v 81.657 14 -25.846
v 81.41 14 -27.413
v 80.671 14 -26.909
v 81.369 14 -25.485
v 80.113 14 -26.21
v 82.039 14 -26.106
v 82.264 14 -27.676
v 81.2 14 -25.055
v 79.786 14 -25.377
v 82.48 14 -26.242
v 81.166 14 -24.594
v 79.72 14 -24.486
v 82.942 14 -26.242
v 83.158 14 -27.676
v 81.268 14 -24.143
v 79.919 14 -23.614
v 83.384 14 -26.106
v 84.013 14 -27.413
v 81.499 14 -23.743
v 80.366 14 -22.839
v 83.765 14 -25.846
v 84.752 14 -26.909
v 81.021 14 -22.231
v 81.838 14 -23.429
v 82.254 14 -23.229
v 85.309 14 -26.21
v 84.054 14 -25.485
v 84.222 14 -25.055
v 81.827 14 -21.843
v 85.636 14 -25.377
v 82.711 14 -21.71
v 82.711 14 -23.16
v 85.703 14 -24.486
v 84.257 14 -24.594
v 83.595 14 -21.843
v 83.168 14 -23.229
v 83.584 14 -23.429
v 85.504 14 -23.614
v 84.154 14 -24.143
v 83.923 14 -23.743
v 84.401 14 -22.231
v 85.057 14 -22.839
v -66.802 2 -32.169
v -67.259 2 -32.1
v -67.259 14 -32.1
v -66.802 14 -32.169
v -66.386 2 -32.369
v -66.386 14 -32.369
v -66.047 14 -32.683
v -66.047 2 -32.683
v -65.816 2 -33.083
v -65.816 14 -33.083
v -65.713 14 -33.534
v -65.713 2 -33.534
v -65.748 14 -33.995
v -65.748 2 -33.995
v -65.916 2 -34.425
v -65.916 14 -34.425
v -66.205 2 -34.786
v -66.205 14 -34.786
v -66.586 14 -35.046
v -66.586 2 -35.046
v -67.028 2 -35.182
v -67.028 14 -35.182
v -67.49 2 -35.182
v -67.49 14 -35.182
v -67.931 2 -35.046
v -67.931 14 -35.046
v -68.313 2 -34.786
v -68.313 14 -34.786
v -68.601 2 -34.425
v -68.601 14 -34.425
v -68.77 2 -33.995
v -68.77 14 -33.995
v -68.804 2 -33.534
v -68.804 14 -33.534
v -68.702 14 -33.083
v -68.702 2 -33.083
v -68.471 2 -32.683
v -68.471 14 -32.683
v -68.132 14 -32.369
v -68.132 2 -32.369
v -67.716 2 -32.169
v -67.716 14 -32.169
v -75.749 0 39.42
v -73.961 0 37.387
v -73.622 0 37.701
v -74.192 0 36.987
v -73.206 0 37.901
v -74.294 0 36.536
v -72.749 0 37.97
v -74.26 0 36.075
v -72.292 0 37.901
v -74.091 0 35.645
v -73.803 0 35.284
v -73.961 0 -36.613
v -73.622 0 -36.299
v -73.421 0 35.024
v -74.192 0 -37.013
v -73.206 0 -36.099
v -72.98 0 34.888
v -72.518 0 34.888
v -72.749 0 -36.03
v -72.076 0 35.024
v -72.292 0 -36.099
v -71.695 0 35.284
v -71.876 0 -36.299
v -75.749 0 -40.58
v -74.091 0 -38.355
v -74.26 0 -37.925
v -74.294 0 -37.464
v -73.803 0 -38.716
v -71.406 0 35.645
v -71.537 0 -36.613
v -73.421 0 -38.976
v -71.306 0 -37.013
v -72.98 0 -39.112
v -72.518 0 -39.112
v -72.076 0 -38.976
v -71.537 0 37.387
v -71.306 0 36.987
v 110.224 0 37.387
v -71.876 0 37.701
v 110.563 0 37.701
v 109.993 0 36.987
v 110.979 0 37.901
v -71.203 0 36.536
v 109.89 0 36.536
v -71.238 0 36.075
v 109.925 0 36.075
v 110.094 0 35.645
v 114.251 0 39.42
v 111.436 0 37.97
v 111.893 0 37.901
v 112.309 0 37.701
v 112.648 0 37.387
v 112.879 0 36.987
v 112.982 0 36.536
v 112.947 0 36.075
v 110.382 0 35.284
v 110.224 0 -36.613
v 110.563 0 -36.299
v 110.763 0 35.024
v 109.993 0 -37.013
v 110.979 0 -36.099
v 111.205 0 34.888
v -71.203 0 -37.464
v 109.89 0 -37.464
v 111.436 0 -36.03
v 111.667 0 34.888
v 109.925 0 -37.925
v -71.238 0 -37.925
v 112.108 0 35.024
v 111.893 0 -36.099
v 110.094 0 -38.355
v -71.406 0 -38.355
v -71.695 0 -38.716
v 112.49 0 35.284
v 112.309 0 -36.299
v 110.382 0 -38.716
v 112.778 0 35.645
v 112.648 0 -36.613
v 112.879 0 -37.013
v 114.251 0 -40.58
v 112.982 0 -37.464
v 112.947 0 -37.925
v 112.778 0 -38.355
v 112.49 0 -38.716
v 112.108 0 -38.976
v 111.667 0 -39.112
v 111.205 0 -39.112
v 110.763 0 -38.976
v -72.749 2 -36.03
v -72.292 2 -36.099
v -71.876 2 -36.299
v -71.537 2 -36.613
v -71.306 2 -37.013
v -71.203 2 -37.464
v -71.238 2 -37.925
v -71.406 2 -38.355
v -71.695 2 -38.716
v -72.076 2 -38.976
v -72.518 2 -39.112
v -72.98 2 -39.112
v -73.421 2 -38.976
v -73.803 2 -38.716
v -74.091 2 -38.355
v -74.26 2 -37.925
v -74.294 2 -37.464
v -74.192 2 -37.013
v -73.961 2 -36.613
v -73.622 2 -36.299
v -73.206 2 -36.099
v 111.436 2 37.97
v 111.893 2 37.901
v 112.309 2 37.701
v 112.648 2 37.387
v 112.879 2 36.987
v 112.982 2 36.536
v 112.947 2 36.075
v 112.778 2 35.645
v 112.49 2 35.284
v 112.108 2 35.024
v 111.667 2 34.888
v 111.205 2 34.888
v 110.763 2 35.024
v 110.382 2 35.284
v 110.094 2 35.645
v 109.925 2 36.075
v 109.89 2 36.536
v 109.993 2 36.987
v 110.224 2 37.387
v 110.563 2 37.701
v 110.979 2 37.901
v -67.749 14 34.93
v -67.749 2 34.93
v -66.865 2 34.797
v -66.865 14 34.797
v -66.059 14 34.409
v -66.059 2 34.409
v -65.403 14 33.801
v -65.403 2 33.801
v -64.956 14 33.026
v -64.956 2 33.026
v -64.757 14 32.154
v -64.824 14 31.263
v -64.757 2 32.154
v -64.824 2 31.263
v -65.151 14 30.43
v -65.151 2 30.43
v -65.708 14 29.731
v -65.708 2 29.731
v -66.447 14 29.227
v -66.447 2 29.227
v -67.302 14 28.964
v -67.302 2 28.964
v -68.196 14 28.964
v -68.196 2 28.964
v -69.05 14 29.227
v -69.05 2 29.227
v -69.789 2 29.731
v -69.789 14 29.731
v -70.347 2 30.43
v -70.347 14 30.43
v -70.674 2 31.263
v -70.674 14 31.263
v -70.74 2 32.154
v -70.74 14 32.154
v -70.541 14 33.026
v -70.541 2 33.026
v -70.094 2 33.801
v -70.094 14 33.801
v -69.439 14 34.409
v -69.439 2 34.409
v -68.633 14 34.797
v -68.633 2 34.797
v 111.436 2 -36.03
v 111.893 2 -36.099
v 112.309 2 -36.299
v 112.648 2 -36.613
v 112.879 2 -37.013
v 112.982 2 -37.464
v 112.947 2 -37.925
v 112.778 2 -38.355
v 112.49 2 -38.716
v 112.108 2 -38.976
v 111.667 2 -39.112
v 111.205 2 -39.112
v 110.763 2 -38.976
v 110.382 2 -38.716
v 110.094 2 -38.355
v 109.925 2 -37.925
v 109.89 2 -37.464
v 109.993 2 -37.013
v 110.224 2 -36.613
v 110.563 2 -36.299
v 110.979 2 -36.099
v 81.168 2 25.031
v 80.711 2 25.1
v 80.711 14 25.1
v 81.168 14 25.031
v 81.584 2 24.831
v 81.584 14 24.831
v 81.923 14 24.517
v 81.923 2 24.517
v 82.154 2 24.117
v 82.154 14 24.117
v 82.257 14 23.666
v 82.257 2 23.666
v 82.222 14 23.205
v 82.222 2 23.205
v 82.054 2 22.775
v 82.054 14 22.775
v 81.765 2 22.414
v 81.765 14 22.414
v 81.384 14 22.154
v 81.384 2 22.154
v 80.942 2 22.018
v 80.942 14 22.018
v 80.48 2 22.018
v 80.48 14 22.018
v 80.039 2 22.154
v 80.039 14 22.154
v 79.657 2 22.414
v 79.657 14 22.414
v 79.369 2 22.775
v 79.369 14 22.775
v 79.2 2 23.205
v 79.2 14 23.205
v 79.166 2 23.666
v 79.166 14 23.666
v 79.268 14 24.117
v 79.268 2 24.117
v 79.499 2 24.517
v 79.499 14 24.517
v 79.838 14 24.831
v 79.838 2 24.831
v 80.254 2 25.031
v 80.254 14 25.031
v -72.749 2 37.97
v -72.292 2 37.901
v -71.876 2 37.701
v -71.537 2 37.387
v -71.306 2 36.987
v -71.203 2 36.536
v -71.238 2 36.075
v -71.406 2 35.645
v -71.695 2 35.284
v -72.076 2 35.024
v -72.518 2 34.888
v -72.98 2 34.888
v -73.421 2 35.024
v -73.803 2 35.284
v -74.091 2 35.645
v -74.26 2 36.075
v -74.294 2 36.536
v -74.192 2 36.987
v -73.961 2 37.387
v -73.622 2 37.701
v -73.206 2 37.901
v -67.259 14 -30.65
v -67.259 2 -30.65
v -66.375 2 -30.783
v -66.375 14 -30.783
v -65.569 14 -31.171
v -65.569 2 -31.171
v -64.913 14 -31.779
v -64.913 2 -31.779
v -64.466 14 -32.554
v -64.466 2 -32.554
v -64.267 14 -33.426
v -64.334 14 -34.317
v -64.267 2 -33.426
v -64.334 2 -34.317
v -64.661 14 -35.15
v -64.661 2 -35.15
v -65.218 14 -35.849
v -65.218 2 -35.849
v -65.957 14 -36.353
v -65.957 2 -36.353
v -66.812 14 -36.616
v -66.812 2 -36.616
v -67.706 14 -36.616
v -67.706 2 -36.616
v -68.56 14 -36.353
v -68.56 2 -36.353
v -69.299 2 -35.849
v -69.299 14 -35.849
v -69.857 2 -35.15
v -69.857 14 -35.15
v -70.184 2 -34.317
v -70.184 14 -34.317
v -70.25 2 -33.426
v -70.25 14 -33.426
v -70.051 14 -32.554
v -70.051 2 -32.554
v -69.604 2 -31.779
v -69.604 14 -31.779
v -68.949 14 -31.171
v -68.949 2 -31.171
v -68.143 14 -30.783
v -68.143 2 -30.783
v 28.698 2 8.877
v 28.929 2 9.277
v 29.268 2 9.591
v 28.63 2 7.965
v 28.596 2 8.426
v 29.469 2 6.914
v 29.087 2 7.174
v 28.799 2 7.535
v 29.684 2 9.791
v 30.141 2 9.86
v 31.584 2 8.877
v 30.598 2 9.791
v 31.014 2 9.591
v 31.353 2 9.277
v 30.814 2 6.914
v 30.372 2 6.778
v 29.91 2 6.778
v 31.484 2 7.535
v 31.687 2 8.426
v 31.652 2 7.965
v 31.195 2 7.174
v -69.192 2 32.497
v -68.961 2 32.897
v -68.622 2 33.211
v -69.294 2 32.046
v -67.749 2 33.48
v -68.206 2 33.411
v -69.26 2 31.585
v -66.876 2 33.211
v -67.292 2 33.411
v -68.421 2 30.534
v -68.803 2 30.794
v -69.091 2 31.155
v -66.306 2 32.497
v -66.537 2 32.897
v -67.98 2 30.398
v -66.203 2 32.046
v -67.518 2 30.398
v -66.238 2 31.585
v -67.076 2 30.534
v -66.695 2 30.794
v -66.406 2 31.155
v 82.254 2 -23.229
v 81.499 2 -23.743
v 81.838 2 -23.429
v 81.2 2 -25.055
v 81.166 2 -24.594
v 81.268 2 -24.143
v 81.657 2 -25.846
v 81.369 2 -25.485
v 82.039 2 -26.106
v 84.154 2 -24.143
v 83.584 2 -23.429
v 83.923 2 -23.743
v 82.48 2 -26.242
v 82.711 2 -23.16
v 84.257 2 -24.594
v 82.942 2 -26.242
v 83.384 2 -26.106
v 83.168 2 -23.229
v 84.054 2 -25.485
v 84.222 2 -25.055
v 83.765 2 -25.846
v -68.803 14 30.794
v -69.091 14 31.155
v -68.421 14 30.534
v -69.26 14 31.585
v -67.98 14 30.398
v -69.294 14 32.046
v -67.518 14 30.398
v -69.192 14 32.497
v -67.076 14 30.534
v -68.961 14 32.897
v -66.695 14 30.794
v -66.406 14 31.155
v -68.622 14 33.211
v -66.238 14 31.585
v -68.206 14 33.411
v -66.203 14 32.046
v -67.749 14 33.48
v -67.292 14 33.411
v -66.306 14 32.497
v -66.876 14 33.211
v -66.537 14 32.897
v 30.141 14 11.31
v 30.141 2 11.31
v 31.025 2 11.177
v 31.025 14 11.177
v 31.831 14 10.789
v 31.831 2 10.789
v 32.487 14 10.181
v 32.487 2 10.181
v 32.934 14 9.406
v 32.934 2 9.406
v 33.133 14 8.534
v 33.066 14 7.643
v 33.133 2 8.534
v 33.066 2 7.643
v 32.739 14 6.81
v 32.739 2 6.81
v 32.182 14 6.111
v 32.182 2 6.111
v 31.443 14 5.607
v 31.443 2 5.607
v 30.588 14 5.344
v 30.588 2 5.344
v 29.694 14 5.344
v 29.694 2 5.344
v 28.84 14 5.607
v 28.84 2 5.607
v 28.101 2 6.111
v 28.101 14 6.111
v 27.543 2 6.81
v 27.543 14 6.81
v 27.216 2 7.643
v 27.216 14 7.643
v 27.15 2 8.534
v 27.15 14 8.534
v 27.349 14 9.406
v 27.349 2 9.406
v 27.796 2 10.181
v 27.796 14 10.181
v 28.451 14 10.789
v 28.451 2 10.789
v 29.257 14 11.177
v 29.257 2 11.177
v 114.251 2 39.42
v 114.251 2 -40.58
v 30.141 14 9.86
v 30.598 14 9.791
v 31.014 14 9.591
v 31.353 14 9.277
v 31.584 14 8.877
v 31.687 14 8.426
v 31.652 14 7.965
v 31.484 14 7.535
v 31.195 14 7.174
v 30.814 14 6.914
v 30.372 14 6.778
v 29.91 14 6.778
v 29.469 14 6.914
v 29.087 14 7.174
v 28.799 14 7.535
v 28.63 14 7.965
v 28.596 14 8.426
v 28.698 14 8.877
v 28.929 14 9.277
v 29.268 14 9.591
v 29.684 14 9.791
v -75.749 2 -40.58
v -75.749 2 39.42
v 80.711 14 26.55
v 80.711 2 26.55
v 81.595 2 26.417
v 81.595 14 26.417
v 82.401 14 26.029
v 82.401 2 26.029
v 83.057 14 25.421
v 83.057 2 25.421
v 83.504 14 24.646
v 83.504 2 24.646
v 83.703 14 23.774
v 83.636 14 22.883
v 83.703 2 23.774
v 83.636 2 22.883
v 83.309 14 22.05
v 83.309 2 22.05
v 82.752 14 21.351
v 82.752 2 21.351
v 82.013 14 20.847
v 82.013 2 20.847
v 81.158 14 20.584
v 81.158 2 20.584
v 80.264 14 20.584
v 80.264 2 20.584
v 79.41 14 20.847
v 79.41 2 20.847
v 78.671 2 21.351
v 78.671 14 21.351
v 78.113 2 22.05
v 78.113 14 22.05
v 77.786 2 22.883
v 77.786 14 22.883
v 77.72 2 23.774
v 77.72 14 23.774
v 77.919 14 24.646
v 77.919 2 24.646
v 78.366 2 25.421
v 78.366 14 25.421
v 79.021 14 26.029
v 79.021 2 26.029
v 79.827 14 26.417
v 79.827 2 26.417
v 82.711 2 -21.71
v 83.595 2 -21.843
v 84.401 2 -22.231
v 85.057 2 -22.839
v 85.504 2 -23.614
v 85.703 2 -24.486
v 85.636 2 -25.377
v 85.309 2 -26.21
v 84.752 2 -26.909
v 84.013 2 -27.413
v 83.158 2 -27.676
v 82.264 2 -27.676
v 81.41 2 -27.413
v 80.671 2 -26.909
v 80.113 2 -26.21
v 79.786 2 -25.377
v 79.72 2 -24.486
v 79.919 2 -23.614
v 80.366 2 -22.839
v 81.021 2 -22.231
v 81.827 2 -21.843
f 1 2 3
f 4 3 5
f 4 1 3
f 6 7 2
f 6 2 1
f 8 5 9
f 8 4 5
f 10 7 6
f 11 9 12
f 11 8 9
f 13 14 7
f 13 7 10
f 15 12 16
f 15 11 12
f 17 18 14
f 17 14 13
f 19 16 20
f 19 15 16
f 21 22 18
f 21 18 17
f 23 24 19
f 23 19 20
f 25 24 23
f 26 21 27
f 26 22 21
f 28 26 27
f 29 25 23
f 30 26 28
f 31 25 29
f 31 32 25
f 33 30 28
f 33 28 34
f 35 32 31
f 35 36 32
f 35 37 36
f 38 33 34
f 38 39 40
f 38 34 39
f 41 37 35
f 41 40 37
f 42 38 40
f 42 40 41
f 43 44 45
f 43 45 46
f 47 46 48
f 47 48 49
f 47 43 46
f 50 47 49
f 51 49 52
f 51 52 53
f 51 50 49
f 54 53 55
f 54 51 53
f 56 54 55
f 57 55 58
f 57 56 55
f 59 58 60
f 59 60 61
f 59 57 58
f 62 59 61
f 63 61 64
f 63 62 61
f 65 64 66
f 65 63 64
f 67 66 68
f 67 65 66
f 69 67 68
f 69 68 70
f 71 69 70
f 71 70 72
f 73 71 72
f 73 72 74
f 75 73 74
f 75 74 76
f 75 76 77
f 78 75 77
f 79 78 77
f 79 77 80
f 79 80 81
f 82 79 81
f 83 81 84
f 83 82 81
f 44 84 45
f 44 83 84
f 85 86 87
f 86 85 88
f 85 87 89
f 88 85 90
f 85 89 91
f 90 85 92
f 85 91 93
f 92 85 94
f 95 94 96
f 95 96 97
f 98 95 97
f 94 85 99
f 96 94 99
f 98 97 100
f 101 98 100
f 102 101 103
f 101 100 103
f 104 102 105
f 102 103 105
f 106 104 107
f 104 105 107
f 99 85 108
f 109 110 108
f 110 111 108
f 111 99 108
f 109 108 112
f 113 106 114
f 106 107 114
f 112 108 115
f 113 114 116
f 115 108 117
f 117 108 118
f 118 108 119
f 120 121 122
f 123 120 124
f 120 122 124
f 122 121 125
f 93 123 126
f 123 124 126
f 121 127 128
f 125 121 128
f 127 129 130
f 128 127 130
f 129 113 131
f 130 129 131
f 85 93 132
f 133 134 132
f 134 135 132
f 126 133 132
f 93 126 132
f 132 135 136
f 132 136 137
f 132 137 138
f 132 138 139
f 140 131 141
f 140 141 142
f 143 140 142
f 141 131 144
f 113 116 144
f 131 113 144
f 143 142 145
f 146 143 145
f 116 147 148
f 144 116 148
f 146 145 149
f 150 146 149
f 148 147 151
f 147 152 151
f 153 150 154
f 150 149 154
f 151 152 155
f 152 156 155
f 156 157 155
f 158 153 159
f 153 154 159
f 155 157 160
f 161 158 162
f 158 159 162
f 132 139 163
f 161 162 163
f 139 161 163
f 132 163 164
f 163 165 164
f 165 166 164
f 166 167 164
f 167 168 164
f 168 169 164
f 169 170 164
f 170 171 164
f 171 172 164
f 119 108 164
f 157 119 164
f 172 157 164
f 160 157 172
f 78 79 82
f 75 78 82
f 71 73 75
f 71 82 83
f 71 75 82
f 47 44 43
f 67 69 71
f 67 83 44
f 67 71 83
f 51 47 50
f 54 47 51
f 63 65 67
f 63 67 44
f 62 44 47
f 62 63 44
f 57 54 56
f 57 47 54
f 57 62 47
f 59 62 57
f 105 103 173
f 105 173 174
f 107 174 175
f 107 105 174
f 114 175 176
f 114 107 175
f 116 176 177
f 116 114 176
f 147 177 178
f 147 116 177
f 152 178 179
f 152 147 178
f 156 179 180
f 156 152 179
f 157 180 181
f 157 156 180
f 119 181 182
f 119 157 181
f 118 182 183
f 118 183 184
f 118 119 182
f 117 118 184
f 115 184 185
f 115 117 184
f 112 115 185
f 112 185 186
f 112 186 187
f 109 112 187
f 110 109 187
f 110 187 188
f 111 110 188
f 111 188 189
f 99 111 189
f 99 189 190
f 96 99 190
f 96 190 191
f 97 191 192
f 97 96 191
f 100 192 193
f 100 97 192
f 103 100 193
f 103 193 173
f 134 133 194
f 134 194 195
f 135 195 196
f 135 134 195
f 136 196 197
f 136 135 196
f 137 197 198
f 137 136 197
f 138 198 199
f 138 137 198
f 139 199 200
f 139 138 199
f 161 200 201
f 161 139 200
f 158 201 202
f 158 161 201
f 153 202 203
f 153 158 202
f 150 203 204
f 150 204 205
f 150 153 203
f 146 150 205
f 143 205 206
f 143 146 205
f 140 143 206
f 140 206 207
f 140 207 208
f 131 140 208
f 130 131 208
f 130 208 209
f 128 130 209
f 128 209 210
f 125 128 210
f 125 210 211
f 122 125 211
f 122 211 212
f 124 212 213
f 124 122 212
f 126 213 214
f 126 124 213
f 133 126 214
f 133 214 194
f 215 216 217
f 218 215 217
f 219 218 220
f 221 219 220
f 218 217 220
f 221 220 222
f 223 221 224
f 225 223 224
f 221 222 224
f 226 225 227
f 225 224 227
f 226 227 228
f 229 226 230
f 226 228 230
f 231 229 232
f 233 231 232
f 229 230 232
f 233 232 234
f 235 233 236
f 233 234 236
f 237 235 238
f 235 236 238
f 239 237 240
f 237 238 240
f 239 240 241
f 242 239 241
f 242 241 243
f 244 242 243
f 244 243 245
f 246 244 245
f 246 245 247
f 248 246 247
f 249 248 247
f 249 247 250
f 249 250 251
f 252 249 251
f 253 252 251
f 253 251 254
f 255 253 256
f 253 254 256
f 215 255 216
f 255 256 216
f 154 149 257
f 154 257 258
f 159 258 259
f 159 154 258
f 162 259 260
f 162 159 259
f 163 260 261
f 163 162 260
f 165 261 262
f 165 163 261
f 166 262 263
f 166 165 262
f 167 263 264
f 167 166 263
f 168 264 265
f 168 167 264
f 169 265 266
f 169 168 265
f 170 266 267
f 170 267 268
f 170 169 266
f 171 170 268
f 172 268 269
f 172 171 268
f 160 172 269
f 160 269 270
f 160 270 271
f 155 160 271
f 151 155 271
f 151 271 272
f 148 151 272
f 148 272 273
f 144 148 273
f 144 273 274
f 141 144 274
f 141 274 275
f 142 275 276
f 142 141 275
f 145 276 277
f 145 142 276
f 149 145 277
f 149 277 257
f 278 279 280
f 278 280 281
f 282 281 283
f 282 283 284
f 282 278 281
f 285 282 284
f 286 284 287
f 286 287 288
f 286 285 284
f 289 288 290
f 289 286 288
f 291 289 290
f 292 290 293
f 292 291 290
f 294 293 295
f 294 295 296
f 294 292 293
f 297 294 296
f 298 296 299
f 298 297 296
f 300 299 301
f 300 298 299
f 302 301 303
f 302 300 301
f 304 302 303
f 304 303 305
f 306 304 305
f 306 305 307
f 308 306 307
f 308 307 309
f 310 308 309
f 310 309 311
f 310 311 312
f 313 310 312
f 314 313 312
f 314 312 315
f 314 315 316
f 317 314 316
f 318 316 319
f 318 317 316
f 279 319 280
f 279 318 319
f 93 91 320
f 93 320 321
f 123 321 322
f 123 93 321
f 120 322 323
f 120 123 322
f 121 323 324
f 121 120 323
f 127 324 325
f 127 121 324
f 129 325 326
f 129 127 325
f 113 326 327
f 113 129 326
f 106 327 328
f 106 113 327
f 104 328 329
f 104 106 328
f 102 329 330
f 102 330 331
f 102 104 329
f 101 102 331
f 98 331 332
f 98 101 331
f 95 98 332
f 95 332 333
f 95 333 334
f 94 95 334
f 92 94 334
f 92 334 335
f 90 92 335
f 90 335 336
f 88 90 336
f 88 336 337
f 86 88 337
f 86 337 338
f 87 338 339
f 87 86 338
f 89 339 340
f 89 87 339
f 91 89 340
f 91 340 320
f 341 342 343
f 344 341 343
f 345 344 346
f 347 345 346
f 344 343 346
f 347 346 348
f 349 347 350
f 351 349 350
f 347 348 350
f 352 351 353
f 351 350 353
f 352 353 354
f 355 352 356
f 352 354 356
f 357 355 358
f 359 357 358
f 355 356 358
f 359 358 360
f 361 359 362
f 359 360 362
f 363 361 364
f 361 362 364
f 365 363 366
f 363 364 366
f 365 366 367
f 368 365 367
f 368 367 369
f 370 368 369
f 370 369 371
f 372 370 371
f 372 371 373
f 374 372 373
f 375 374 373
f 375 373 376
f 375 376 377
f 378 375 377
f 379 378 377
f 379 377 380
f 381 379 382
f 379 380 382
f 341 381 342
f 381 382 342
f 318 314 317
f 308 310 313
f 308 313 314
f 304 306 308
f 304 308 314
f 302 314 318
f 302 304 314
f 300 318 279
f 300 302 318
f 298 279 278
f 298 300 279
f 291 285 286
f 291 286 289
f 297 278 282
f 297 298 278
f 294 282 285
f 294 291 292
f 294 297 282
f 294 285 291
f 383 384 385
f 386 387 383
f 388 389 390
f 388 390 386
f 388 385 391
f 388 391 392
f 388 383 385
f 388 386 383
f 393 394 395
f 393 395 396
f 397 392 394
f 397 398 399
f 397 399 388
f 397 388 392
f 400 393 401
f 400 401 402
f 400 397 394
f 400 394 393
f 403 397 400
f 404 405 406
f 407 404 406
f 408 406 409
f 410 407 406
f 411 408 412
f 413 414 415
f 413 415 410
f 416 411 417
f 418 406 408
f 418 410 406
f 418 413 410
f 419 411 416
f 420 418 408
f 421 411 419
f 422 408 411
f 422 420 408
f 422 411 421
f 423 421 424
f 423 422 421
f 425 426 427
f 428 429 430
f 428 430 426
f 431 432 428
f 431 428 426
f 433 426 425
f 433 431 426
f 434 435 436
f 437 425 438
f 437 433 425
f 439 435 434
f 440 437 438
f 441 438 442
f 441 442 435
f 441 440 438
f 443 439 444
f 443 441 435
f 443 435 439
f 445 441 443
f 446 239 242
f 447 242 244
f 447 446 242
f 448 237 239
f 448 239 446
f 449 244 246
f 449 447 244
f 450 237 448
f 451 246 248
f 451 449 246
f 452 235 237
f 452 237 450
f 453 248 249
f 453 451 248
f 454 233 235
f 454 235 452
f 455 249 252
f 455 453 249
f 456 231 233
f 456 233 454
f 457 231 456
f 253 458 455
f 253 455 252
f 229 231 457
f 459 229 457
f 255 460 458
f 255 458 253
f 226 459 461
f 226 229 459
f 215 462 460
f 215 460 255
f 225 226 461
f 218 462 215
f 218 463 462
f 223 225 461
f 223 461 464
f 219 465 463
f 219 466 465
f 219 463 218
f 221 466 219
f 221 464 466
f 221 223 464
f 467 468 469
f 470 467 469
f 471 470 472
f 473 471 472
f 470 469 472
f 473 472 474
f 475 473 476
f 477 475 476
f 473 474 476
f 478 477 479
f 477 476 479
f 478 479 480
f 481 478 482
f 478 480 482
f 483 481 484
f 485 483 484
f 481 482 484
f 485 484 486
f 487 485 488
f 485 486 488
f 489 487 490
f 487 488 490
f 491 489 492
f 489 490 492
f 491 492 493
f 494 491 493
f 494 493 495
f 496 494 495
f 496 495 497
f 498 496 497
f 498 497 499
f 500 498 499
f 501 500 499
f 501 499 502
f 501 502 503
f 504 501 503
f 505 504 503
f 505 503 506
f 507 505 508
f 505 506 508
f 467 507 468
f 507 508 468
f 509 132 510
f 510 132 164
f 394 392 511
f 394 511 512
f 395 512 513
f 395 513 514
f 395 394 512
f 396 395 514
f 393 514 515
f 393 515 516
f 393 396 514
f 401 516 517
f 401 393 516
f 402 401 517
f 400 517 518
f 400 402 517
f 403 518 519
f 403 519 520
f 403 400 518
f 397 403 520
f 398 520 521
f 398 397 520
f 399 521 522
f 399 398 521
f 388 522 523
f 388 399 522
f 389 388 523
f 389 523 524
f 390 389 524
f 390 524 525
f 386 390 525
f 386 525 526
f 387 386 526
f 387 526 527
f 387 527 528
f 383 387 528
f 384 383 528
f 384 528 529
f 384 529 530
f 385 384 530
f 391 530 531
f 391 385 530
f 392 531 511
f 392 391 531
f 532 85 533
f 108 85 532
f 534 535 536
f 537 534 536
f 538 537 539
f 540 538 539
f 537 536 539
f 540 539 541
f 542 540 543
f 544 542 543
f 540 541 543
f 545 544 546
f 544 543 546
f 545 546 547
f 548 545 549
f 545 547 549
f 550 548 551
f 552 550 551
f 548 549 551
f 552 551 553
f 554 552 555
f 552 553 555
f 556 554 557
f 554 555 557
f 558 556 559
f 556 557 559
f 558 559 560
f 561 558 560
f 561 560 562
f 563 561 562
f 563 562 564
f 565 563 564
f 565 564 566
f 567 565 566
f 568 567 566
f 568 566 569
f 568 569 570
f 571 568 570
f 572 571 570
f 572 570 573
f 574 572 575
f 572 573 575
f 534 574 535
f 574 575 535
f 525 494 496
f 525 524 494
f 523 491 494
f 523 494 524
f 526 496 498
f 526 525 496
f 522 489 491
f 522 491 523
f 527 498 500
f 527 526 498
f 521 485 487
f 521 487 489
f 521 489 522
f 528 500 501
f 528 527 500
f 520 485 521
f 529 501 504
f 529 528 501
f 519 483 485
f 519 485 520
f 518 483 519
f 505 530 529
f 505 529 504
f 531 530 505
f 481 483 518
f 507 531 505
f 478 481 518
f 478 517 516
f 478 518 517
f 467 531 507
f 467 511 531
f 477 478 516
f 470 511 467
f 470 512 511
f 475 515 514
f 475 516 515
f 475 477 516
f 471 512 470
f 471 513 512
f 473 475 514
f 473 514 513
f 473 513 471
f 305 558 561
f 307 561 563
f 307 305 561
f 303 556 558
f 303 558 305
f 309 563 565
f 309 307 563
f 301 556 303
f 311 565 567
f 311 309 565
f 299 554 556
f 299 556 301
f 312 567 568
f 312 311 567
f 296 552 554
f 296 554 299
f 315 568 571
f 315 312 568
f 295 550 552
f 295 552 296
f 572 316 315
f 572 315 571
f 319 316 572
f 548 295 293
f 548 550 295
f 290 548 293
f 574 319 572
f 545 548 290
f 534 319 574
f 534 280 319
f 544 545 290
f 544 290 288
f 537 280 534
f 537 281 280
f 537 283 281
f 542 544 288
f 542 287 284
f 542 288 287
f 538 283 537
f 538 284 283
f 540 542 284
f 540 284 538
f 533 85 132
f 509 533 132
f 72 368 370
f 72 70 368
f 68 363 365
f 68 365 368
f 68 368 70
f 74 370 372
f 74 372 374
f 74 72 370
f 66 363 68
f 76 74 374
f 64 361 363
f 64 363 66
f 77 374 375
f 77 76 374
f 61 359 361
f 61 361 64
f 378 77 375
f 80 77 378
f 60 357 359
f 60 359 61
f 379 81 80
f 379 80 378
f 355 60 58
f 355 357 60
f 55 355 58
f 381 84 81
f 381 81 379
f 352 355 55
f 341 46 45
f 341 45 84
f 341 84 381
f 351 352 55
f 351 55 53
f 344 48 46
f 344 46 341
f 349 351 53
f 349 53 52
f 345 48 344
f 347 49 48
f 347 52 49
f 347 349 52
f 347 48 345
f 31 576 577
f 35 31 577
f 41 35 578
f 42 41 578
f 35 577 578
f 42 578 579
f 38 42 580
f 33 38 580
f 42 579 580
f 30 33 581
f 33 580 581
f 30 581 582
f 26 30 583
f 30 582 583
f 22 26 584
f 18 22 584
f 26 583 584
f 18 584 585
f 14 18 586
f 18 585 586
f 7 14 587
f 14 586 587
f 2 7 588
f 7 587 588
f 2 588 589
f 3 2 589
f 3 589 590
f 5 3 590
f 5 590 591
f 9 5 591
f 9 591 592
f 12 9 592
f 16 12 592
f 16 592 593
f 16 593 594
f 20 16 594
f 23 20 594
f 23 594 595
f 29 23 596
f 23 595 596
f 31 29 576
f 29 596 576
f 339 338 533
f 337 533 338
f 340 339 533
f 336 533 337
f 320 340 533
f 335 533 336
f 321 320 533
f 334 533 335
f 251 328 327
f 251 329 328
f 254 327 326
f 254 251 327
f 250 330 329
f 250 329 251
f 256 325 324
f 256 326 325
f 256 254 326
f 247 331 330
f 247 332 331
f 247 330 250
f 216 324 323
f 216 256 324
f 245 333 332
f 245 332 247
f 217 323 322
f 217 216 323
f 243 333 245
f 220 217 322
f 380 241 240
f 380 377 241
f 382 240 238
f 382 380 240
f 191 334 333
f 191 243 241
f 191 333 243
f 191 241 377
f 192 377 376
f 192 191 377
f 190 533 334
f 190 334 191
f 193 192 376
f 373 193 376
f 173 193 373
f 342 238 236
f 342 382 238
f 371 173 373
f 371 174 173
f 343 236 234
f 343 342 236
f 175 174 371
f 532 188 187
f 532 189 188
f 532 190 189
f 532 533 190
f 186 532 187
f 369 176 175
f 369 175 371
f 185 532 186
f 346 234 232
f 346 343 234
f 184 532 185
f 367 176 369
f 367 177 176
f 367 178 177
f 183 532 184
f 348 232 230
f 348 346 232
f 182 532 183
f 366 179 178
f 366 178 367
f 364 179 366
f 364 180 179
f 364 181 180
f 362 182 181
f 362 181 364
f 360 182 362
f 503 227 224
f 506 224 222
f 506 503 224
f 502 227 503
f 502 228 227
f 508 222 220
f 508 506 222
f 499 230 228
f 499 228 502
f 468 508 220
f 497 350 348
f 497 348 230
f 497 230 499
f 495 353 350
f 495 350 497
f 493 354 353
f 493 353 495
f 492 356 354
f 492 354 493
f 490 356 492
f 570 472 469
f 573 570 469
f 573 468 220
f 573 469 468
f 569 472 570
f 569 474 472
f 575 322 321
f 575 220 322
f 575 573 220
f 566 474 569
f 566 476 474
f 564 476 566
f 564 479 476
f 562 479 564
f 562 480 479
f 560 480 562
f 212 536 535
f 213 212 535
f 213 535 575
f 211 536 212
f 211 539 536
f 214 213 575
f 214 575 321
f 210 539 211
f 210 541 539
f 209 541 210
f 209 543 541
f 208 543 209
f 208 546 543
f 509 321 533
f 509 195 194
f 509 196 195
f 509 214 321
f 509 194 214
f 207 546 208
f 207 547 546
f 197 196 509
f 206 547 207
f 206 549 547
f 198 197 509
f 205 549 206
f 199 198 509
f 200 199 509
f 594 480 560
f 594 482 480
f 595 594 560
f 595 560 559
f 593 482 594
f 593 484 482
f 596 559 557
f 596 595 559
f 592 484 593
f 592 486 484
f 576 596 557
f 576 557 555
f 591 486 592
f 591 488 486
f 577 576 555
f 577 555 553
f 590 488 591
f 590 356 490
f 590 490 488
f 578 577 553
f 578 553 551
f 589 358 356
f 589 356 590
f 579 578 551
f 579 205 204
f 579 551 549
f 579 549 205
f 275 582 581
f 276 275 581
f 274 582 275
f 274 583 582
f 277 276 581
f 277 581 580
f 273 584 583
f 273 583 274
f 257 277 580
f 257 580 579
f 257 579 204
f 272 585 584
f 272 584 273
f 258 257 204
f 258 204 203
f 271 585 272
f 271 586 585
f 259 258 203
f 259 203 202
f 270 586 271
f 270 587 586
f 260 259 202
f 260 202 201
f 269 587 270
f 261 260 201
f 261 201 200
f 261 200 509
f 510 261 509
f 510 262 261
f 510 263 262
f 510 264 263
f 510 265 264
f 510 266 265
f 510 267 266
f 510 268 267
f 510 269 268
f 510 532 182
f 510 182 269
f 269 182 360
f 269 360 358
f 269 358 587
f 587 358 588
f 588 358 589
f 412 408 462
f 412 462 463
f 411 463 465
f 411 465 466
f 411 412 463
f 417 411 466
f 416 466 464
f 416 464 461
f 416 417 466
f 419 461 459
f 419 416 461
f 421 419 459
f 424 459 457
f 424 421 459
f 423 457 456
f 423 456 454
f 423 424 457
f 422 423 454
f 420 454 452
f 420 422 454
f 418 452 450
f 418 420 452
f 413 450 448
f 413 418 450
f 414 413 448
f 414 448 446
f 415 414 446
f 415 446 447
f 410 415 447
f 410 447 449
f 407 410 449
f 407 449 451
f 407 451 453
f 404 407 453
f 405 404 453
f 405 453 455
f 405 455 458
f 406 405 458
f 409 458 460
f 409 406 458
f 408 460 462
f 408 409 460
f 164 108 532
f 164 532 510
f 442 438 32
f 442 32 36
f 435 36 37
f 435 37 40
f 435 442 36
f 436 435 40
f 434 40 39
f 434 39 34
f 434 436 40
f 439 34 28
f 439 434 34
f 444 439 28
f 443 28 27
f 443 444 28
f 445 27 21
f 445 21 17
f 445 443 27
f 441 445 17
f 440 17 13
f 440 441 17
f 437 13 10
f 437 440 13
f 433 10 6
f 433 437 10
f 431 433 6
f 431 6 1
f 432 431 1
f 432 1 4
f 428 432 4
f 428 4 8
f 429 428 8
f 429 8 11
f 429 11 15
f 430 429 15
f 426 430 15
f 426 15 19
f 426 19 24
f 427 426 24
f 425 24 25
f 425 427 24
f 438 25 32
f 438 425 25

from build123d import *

# Parameters (mm, degrees)
SKETCH1_W           = 190
SKETCH1_H           = 80
SKETCH1_R           = 1.55
BOSS_EXTRUDE1_DEPTH = 2
SKETCH2_R           = 3
SKETCH2_R_2         = 1.55
BOSS_EXTRUDE2_DEPTH = 12


with BuildPart() as part:
    # Sketch1 → Boss-Extrude1 (new body)
    with BuildSketch(Plane(origin=(0, 0, 0), x_dir=(1, 0, 0), z_dir=(0, 1, 0))):
        with Locations((19.251207729, 0.579710145)):
            Rectangle(SKETCH1_W, SKETCH1_H)
        with Locations(Location((-72.748792271, 37.579710145, 0), (0, 0, 270))):
            Circle(SKETCH1_R, mode=Mode.SUBTRACT)
        with Locations(Location((111.435917928, 37.579710145, 0), (0, 0, 270))):
            Circle(SKETCH1_R, mode=Mode.SUBTRACT)
        with Locations(Location((111.435917928, -36.420289855, 0), (0, 0, 270))):
            Circle(SKETCH1_R, mode=Mode.SUBTRACT)
        with Locations(Location((-72.748792271, -36.420289855, 0), (0, 0, 270))):
            Circle(SKETCH1_R, mode=Mode.SUBTRACT)
    extrude(amount=BOSS_EXTRUDE1_DEPTH)

    # Sketch2 → Boss-Extrude2 (add)
    # profile 1 of 5: a face of its own
    with BuildSketch(Plane(origin=(0, 2, 0), x_dir=(1, 0, 0), z_dir=(0, 1, 0))):
        with Locations(Location((82.711207729, 24.709710145, 0), (0, 0, 270))):
            Circle(SKETCH2_R)
        with Locations(Location((82.711207729, 24.709710145, 0), (0, 0, 270))):
            Circle(SKETCH2_R_2, mode=Mode.SUBTRACT)
    # profile 2 of 5: a face of its own
    with BuildSketch(Plane(origin=(0, 2, 0), x_dir=(1, 0, 0), z_dir=(0, 1, 0))):
        with Locations(Location((80.711207729, -23.550289855, 0), (0, 0, 270))):
            Circle(SKETCH2_R)
        with Locations(Location((80.711207729, -23.550289855, 0), (0, 0, 270))):
            Circle(SKETCH2_R_2, mode=Mode.SUBTRACT)
    # profile 3 of 5: a face of its own
    with BuildSketch(Plane(origin=(0, 2, 0), x_dir=(1, 0, 0), z_dir=(0, 1, 0))):
        with Locations(Location((30.141207729, -8.310289855, 0), (0, 0, 270))):
            Circle(SKETCH2_R)
        with Locations(Location((30.141207729, -8.310289855, 0), (0, 0, 270))):
            Circle(SKETCH2_R_2, mode=Mode.SUBTRACT)
    # profile 4 of 5: a face of its own
    with BuildSketch(Plane(origin=(0, 2, 0), x_dir=(1, 0, 0), z_dir=(0, 1, 0))):
        with Locations(Location((-67.258792271, 33.649710145, 0), (0, 0, 270))):
            Circle(SKETCH2_R)
        with Locations(Location((-67.258792271, 33.649710145, 0), (0, 0, 270))):
            Circle(SKETCH2_R_2, mode=Mode.SUBTRACT)
    # profile 5 of 5: a face of its own
    with BuildSketch(Plane(origin=(0, 2, 0), x_dir=(1, 0, 0), z_dir=(0, 1, 0))):
        with Locations(Location((-67.748792271, -31.930289855, 0), (0, 0, 270))):
            Circle(SKETCH2_R)
        with Locations(Location((-67.748792271, -31.930289855, 0), (0, 0, 270))):
            Circle(SKETCH2_R_2, mode=Mode.SUBTRACT)
    extrude(amount=BOSS_EXTRUDE2_DEPTH)


solid = part.part
